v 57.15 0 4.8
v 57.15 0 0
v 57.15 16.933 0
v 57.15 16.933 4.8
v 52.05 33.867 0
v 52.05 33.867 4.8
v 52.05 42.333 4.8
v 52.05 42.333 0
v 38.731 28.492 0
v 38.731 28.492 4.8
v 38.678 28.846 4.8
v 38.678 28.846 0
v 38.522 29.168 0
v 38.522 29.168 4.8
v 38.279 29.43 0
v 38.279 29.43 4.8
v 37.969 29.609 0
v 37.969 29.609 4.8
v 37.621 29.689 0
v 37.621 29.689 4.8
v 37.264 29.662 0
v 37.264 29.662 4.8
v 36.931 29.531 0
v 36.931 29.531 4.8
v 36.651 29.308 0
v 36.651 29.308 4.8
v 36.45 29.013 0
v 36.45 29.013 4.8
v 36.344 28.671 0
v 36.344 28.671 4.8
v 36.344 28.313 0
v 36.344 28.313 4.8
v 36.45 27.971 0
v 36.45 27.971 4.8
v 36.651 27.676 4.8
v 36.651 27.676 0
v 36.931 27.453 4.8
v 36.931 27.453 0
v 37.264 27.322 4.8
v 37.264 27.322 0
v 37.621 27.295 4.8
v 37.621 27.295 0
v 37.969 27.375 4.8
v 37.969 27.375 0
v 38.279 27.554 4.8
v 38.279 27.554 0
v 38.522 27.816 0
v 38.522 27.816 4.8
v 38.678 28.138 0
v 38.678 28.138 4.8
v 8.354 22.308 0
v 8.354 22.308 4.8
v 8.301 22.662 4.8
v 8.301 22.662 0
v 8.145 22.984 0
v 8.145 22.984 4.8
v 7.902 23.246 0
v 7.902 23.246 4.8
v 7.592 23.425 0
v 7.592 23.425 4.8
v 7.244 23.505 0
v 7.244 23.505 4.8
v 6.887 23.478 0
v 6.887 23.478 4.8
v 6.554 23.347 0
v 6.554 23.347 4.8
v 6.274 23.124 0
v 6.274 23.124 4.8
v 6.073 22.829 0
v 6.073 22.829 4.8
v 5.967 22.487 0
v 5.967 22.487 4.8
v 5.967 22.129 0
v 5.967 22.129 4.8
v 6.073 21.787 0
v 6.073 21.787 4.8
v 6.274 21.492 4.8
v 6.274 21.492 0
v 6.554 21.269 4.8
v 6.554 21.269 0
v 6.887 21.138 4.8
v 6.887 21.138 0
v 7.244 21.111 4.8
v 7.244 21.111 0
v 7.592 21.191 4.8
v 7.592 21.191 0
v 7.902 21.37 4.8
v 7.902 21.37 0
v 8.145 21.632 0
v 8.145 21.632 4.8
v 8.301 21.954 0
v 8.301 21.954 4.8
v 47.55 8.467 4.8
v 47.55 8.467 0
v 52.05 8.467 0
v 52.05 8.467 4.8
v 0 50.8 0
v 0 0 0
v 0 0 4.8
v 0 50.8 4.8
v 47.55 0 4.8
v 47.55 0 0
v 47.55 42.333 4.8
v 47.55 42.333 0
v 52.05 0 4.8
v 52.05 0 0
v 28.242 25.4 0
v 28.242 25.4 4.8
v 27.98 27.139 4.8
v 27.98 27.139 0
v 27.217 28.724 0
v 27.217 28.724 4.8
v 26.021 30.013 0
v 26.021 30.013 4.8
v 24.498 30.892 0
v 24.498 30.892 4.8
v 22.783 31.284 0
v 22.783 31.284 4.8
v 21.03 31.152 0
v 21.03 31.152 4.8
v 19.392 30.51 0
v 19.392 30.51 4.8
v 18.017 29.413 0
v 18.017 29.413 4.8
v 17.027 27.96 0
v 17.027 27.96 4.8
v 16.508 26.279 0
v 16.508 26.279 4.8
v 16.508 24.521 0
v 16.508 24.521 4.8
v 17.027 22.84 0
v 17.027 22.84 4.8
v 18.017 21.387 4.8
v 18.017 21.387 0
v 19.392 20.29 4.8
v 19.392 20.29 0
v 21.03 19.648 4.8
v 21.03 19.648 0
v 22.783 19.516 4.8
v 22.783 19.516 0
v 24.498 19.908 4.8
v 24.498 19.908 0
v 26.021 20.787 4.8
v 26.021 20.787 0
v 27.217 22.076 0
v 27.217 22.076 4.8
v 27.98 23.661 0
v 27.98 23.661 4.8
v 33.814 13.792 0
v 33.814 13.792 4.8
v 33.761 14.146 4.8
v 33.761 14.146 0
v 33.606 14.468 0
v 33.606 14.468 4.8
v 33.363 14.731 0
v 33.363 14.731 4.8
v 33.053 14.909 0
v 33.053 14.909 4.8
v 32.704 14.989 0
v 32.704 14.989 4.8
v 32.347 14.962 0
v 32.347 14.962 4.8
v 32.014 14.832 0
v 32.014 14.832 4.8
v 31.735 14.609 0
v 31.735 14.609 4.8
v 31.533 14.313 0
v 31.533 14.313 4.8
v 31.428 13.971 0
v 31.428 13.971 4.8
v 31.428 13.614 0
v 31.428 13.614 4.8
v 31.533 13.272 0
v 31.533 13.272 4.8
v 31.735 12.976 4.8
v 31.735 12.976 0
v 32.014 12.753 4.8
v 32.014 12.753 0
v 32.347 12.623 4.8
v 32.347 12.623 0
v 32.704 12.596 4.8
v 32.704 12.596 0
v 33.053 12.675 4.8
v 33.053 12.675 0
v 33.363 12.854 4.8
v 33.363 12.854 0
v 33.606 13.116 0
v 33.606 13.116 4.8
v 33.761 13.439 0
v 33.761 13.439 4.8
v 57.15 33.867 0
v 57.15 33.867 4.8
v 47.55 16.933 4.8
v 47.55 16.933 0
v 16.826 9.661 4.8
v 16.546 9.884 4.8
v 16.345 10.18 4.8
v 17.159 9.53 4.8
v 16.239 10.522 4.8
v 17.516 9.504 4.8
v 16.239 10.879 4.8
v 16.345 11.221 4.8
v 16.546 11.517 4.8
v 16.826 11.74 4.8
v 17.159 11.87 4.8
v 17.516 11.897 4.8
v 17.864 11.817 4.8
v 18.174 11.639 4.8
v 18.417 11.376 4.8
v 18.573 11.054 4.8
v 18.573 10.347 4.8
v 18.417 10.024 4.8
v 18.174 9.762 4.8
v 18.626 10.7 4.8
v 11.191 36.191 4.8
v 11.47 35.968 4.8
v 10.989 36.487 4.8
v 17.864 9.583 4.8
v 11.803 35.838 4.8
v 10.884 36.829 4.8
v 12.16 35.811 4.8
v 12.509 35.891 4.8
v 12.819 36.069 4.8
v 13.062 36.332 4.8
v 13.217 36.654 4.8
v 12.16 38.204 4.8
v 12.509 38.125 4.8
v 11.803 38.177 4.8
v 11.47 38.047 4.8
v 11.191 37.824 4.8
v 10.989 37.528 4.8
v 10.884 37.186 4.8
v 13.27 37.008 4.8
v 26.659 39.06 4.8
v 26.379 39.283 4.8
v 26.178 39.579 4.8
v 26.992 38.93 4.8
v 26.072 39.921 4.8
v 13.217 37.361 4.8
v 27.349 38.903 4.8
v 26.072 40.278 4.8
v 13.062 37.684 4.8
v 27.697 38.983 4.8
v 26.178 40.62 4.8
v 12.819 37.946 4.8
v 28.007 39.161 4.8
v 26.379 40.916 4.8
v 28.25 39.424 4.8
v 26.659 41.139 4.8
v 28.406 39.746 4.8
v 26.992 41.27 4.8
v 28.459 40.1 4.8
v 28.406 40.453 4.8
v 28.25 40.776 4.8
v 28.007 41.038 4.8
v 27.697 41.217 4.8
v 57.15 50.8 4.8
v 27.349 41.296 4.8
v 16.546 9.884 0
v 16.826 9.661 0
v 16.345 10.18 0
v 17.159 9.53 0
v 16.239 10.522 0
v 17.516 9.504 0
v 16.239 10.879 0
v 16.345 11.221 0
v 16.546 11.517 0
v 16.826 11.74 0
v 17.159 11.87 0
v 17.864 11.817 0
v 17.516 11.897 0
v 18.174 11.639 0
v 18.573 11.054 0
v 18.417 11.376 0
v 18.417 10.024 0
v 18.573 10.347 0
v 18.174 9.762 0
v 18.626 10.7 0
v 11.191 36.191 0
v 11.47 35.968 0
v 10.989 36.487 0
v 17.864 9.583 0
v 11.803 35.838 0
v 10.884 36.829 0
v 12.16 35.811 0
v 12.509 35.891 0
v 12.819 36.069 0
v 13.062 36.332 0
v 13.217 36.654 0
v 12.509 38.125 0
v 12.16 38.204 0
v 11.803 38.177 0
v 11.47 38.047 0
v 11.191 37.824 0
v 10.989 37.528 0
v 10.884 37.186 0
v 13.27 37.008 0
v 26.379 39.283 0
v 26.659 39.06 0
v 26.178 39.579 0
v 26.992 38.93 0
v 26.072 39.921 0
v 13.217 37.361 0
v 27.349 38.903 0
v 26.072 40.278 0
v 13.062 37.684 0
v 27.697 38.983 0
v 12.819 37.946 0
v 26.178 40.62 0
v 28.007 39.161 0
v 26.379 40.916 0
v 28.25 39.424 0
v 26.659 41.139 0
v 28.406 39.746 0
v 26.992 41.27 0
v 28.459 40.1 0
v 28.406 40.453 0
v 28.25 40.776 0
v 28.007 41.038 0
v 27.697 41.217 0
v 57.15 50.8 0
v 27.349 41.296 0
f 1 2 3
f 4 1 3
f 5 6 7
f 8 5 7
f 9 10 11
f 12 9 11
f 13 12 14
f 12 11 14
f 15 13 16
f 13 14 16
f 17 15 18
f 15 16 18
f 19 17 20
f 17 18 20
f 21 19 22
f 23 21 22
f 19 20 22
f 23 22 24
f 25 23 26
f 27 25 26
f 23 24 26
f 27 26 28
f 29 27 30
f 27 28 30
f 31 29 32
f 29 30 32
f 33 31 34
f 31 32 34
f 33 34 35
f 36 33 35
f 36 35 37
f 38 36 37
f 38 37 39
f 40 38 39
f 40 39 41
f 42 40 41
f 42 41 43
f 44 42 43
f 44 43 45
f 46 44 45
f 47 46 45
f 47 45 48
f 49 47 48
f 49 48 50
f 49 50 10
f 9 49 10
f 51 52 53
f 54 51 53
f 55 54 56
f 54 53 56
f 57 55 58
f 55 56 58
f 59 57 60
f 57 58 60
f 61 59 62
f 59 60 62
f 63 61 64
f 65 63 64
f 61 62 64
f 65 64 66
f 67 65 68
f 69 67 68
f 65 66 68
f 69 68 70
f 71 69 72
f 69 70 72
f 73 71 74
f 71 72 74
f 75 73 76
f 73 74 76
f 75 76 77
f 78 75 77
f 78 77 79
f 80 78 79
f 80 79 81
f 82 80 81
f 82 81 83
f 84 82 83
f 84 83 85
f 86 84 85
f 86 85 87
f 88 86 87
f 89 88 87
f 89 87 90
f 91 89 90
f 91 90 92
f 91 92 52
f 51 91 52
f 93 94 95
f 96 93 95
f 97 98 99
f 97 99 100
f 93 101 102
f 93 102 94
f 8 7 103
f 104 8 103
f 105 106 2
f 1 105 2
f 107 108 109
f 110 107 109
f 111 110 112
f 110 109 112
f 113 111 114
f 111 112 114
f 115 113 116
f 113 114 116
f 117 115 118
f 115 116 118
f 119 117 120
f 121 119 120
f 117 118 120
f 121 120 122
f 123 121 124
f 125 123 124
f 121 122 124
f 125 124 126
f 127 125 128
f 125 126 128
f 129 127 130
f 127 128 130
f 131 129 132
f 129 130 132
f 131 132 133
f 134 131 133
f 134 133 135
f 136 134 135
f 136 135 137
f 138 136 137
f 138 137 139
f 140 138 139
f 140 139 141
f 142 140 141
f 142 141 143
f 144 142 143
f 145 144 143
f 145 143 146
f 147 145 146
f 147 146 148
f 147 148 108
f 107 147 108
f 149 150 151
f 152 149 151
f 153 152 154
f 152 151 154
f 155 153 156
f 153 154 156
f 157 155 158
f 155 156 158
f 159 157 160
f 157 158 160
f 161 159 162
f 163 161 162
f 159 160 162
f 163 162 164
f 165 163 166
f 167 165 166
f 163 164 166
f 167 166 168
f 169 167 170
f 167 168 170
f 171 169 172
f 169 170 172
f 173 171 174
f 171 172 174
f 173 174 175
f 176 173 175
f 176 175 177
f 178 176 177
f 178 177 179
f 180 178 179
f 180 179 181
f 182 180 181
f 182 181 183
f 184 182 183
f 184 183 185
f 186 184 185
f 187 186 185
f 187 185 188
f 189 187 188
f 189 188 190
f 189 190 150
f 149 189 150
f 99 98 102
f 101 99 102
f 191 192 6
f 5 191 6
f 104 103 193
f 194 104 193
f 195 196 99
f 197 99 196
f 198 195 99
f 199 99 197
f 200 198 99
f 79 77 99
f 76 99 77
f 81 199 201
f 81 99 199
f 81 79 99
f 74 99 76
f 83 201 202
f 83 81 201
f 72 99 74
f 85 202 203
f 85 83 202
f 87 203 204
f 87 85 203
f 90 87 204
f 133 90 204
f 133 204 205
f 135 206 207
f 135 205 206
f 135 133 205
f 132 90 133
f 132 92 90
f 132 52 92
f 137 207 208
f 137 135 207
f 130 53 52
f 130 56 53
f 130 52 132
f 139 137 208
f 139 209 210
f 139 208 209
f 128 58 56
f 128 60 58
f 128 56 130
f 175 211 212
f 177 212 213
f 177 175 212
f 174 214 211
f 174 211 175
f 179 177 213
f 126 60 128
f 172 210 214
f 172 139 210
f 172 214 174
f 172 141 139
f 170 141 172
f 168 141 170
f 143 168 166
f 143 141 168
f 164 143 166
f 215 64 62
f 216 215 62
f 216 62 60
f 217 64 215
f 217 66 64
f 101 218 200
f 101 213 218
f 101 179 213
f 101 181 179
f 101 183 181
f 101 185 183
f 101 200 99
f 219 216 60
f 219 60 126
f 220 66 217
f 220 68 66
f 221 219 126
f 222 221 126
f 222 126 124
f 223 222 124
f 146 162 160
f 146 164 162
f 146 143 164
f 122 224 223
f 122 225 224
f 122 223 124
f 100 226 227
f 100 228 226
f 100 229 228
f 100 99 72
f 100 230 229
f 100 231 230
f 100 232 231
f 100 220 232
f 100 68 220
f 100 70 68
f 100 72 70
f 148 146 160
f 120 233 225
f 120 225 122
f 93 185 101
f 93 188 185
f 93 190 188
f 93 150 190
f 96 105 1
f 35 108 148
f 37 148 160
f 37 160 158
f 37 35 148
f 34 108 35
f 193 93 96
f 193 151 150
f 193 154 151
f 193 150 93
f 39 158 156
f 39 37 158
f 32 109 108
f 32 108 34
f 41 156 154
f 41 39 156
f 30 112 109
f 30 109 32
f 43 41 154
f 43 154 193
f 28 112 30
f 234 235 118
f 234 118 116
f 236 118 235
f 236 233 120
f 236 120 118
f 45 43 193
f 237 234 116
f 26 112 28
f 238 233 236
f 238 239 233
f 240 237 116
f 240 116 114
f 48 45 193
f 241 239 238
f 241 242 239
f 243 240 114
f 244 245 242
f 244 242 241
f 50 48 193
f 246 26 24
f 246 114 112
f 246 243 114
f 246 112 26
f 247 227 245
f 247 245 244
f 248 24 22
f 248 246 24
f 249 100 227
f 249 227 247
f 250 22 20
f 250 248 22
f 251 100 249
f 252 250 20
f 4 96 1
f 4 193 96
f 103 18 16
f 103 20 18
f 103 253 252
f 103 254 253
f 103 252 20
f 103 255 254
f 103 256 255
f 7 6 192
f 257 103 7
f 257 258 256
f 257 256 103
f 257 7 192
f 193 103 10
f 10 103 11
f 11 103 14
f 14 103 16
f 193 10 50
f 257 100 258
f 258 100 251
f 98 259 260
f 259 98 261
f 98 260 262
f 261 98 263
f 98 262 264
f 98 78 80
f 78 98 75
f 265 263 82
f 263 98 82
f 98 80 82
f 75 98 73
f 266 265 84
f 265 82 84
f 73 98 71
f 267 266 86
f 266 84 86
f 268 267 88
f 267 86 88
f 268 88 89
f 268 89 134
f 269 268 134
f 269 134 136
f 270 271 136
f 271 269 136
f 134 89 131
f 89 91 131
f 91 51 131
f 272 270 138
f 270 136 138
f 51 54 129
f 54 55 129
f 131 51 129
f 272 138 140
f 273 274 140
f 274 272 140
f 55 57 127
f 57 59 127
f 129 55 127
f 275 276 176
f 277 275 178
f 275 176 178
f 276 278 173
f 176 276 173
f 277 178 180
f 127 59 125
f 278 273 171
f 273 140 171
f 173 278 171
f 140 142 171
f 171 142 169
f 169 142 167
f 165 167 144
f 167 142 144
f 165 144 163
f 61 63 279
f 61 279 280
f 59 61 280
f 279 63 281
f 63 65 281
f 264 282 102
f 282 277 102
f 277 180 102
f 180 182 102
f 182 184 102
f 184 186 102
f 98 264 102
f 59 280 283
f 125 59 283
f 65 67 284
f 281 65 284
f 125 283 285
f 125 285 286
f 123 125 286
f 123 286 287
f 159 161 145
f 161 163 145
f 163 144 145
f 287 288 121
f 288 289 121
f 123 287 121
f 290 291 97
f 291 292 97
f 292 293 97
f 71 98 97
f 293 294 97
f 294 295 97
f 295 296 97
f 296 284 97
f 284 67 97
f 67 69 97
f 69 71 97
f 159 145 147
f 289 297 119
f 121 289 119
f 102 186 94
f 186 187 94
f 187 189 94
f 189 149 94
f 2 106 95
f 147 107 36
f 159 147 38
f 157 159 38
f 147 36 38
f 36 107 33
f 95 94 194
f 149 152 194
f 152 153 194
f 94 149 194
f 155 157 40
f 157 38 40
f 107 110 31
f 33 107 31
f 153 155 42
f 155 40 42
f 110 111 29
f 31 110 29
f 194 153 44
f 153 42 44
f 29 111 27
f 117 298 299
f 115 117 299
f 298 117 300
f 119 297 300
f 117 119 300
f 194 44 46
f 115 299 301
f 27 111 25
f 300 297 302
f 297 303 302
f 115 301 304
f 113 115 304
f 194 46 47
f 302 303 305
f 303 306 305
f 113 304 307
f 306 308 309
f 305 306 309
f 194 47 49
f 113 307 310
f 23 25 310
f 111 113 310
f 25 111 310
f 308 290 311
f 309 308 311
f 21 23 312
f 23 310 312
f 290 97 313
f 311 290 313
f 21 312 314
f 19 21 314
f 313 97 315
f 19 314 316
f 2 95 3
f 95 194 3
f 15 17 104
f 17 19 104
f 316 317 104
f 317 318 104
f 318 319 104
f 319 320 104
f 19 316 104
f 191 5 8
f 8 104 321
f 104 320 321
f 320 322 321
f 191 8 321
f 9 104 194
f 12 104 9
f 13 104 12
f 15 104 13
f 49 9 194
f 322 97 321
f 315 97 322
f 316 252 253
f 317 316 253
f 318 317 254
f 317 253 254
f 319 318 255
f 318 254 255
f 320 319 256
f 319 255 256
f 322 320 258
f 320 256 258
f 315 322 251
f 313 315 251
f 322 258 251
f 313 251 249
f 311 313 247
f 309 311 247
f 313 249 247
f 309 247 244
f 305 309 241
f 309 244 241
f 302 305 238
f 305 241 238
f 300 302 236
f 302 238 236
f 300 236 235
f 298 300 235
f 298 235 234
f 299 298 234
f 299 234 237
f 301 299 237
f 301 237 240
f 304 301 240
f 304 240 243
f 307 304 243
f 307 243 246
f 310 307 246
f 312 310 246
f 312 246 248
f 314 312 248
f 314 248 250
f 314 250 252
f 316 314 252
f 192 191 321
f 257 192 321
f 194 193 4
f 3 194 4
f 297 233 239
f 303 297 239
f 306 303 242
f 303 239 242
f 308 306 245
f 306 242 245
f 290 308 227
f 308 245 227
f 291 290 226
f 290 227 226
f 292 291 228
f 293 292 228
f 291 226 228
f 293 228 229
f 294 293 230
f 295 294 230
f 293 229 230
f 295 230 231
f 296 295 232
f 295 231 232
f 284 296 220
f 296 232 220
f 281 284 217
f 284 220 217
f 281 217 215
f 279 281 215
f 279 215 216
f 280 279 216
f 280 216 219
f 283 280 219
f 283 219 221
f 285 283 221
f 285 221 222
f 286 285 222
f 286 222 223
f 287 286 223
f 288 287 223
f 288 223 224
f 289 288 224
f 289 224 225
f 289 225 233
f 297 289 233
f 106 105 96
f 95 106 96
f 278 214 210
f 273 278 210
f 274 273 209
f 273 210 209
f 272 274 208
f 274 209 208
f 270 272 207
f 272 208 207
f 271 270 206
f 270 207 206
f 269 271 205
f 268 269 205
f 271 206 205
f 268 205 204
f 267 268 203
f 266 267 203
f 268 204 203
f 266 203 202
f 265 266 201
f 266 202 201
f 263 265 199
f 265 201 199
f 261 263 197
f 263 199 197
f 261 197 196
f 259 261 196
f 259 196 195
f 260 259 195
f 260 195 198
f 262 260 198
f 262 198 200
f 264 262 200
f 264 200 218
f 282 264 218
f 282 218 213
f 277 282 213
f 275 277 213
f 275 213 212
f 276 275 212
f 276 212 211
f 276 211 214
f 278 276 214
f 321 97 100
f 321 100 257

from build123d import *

# Parameters (mm, degrees)
SKETCH1_W           = 57.15
SKETCH1_H           = 50.8
BOSS_EXTRUDE1_DEPTH = 4.800000052
CUT_EXTRUDE4_DEPTH  = 77.614636333
SKETCH7_R           = 5.9
CUT_EXTRUDE6_DEPTH  = 100.346049289
SKETCH10_R          = 1.2
CUT_EXTRUDE9_DEPTH  = 100.346049289
SKETCH11_W          = 4.500000144
SKETCH11_H          = 8.466666667
CUT_EXTRUDE10_DEPTH = 77.614636333
CUT_EXTRUDE11_DEPTH = 77.614636333


with BuildPart() as part:
    # Sketch1 → Boss-Extrude1 (new body)
    with BuildSketch(Plane.XY):
        with Locations((28.575, 25.4)):
            Rectangle(SKETCH1_W, SKETCH1_H)
    extrude(amount=BOSS_EXTRUDE1_DEPTH)

    # Sketch5 → Cut-Extrude4 (cut, through all)
    with BuildSketch(Plane.XY.offset(4.800000052)):
        Polygon((52.349999948, 25.4), (57.15, 16.933333333), (57.15, 33.866666667), align=None)
        Polygon((47.549999896, 16.933333333), (57.15, 16.933333333), (52.349999948, 25.4), align=None)
        Polygon((47.549999896, 33.866666667), (47.549999896, 16.933333333), (52.349999948, 25.4), align=None)
        Polygon((52.349999948, 25.4), (57.15, 33.866666667), (47.549999896, 33.866666667), align=None)
    extrude(amount=-CUT_EXTRUDE4_DEPTH, mode=Mode.SUBTRACT)

    # Sketch7 → Cut-Extrude6 (cut, through all)
    with BuildSketch(Plane(origin=(60.342507963, 78.774229552, 4.800000052), x_dir=(0, 1, 0), z_dir=(0, 0, 1))):
        with Locations(Location((-53.374229552, 38.000051, 0), (0, 0, 270))):
            Circle(SKETCH7_R)
    extrude(amount=-CUT_EXTRUDE6_DEPTH, mode=Mode.SUBTRACT)

    # Sketch10 → Cut-Extrude9 (cut, through all)
    with BuildSketch(Plane(origin=(60.342507963, 78.774229552, 4.800000052), x_dir=(0, 1, 0), z_dir=(0, 0, 1))):
        with Locations(Location((-64.981804426, 27.728040216, 0), (0, 0, 270))):
            Circle(SKETCH10_R)
        with Locations(Location((-56.466264402, 53.188511109, 0), (0, 0, 270))):
            Circle(SKETCH10_R)
        with Locations(Location((-68.073839276, 42.916500326, 0), (0, 0, 270))):
            Circle(SKETCH10_R)
        with Locations(Location((-50.282194703, 22.811590891, 0), (0, 0, 270))):
            Circle(SKETCH10_R)
        with Locations(Location((-38.674619828, 33.083601674, 0), (0, 0, 270))):
            Circle(SKETCH10_R)
        with Locations(Location((-41.766654678, 48.272061784, 0), (0, 0, 270))):
            Circle(SKETCH10_R)
    extrude(amount=-CUT_EXTRUDE9_DEPTH, mode=Mode.SUBTRACT)

    # Sketch11 → Cut-Extrude10 (cut, through all)
    with BuildSketch(Plane.XY.offset(4.800000052)):
        with Locations((49.799999968, 4.233333334)):
            Rectangle(SKETCH11_W, SKETCH11_H)
    extrude(amount=-CUT_EXTRUDE10_DEPTH, mode=Mode.SUBTRACT)

    # Sketch12 → Cut-Extrude11 (cut, through all)
    with BuildSketch(Plane.XY.offset(4.800000052)):
        Polygon((49.799999968, 38.1), (47.549999896, 33.866666667), (52.05000004, 33.866666667), align=None)
        Polygon((47.549999896, 42.333333333), (47.549999896, 33.866666667), (49.799999968, 38.1), align=None)
        Polygon((49.799999968, 38.1), (52.05000004, 33.866666667), (52.05000004, 42.333333333), align=None)
        Polygon((52.05000004, 42.333333333), (47.549999896, 42.333333333), (49.799999968, 38.1), align=None)
    extrude(amount=-CUT_EXTRUDE11_DEPTH, mode=Mode.SUBTRACT)


solid = part.part
